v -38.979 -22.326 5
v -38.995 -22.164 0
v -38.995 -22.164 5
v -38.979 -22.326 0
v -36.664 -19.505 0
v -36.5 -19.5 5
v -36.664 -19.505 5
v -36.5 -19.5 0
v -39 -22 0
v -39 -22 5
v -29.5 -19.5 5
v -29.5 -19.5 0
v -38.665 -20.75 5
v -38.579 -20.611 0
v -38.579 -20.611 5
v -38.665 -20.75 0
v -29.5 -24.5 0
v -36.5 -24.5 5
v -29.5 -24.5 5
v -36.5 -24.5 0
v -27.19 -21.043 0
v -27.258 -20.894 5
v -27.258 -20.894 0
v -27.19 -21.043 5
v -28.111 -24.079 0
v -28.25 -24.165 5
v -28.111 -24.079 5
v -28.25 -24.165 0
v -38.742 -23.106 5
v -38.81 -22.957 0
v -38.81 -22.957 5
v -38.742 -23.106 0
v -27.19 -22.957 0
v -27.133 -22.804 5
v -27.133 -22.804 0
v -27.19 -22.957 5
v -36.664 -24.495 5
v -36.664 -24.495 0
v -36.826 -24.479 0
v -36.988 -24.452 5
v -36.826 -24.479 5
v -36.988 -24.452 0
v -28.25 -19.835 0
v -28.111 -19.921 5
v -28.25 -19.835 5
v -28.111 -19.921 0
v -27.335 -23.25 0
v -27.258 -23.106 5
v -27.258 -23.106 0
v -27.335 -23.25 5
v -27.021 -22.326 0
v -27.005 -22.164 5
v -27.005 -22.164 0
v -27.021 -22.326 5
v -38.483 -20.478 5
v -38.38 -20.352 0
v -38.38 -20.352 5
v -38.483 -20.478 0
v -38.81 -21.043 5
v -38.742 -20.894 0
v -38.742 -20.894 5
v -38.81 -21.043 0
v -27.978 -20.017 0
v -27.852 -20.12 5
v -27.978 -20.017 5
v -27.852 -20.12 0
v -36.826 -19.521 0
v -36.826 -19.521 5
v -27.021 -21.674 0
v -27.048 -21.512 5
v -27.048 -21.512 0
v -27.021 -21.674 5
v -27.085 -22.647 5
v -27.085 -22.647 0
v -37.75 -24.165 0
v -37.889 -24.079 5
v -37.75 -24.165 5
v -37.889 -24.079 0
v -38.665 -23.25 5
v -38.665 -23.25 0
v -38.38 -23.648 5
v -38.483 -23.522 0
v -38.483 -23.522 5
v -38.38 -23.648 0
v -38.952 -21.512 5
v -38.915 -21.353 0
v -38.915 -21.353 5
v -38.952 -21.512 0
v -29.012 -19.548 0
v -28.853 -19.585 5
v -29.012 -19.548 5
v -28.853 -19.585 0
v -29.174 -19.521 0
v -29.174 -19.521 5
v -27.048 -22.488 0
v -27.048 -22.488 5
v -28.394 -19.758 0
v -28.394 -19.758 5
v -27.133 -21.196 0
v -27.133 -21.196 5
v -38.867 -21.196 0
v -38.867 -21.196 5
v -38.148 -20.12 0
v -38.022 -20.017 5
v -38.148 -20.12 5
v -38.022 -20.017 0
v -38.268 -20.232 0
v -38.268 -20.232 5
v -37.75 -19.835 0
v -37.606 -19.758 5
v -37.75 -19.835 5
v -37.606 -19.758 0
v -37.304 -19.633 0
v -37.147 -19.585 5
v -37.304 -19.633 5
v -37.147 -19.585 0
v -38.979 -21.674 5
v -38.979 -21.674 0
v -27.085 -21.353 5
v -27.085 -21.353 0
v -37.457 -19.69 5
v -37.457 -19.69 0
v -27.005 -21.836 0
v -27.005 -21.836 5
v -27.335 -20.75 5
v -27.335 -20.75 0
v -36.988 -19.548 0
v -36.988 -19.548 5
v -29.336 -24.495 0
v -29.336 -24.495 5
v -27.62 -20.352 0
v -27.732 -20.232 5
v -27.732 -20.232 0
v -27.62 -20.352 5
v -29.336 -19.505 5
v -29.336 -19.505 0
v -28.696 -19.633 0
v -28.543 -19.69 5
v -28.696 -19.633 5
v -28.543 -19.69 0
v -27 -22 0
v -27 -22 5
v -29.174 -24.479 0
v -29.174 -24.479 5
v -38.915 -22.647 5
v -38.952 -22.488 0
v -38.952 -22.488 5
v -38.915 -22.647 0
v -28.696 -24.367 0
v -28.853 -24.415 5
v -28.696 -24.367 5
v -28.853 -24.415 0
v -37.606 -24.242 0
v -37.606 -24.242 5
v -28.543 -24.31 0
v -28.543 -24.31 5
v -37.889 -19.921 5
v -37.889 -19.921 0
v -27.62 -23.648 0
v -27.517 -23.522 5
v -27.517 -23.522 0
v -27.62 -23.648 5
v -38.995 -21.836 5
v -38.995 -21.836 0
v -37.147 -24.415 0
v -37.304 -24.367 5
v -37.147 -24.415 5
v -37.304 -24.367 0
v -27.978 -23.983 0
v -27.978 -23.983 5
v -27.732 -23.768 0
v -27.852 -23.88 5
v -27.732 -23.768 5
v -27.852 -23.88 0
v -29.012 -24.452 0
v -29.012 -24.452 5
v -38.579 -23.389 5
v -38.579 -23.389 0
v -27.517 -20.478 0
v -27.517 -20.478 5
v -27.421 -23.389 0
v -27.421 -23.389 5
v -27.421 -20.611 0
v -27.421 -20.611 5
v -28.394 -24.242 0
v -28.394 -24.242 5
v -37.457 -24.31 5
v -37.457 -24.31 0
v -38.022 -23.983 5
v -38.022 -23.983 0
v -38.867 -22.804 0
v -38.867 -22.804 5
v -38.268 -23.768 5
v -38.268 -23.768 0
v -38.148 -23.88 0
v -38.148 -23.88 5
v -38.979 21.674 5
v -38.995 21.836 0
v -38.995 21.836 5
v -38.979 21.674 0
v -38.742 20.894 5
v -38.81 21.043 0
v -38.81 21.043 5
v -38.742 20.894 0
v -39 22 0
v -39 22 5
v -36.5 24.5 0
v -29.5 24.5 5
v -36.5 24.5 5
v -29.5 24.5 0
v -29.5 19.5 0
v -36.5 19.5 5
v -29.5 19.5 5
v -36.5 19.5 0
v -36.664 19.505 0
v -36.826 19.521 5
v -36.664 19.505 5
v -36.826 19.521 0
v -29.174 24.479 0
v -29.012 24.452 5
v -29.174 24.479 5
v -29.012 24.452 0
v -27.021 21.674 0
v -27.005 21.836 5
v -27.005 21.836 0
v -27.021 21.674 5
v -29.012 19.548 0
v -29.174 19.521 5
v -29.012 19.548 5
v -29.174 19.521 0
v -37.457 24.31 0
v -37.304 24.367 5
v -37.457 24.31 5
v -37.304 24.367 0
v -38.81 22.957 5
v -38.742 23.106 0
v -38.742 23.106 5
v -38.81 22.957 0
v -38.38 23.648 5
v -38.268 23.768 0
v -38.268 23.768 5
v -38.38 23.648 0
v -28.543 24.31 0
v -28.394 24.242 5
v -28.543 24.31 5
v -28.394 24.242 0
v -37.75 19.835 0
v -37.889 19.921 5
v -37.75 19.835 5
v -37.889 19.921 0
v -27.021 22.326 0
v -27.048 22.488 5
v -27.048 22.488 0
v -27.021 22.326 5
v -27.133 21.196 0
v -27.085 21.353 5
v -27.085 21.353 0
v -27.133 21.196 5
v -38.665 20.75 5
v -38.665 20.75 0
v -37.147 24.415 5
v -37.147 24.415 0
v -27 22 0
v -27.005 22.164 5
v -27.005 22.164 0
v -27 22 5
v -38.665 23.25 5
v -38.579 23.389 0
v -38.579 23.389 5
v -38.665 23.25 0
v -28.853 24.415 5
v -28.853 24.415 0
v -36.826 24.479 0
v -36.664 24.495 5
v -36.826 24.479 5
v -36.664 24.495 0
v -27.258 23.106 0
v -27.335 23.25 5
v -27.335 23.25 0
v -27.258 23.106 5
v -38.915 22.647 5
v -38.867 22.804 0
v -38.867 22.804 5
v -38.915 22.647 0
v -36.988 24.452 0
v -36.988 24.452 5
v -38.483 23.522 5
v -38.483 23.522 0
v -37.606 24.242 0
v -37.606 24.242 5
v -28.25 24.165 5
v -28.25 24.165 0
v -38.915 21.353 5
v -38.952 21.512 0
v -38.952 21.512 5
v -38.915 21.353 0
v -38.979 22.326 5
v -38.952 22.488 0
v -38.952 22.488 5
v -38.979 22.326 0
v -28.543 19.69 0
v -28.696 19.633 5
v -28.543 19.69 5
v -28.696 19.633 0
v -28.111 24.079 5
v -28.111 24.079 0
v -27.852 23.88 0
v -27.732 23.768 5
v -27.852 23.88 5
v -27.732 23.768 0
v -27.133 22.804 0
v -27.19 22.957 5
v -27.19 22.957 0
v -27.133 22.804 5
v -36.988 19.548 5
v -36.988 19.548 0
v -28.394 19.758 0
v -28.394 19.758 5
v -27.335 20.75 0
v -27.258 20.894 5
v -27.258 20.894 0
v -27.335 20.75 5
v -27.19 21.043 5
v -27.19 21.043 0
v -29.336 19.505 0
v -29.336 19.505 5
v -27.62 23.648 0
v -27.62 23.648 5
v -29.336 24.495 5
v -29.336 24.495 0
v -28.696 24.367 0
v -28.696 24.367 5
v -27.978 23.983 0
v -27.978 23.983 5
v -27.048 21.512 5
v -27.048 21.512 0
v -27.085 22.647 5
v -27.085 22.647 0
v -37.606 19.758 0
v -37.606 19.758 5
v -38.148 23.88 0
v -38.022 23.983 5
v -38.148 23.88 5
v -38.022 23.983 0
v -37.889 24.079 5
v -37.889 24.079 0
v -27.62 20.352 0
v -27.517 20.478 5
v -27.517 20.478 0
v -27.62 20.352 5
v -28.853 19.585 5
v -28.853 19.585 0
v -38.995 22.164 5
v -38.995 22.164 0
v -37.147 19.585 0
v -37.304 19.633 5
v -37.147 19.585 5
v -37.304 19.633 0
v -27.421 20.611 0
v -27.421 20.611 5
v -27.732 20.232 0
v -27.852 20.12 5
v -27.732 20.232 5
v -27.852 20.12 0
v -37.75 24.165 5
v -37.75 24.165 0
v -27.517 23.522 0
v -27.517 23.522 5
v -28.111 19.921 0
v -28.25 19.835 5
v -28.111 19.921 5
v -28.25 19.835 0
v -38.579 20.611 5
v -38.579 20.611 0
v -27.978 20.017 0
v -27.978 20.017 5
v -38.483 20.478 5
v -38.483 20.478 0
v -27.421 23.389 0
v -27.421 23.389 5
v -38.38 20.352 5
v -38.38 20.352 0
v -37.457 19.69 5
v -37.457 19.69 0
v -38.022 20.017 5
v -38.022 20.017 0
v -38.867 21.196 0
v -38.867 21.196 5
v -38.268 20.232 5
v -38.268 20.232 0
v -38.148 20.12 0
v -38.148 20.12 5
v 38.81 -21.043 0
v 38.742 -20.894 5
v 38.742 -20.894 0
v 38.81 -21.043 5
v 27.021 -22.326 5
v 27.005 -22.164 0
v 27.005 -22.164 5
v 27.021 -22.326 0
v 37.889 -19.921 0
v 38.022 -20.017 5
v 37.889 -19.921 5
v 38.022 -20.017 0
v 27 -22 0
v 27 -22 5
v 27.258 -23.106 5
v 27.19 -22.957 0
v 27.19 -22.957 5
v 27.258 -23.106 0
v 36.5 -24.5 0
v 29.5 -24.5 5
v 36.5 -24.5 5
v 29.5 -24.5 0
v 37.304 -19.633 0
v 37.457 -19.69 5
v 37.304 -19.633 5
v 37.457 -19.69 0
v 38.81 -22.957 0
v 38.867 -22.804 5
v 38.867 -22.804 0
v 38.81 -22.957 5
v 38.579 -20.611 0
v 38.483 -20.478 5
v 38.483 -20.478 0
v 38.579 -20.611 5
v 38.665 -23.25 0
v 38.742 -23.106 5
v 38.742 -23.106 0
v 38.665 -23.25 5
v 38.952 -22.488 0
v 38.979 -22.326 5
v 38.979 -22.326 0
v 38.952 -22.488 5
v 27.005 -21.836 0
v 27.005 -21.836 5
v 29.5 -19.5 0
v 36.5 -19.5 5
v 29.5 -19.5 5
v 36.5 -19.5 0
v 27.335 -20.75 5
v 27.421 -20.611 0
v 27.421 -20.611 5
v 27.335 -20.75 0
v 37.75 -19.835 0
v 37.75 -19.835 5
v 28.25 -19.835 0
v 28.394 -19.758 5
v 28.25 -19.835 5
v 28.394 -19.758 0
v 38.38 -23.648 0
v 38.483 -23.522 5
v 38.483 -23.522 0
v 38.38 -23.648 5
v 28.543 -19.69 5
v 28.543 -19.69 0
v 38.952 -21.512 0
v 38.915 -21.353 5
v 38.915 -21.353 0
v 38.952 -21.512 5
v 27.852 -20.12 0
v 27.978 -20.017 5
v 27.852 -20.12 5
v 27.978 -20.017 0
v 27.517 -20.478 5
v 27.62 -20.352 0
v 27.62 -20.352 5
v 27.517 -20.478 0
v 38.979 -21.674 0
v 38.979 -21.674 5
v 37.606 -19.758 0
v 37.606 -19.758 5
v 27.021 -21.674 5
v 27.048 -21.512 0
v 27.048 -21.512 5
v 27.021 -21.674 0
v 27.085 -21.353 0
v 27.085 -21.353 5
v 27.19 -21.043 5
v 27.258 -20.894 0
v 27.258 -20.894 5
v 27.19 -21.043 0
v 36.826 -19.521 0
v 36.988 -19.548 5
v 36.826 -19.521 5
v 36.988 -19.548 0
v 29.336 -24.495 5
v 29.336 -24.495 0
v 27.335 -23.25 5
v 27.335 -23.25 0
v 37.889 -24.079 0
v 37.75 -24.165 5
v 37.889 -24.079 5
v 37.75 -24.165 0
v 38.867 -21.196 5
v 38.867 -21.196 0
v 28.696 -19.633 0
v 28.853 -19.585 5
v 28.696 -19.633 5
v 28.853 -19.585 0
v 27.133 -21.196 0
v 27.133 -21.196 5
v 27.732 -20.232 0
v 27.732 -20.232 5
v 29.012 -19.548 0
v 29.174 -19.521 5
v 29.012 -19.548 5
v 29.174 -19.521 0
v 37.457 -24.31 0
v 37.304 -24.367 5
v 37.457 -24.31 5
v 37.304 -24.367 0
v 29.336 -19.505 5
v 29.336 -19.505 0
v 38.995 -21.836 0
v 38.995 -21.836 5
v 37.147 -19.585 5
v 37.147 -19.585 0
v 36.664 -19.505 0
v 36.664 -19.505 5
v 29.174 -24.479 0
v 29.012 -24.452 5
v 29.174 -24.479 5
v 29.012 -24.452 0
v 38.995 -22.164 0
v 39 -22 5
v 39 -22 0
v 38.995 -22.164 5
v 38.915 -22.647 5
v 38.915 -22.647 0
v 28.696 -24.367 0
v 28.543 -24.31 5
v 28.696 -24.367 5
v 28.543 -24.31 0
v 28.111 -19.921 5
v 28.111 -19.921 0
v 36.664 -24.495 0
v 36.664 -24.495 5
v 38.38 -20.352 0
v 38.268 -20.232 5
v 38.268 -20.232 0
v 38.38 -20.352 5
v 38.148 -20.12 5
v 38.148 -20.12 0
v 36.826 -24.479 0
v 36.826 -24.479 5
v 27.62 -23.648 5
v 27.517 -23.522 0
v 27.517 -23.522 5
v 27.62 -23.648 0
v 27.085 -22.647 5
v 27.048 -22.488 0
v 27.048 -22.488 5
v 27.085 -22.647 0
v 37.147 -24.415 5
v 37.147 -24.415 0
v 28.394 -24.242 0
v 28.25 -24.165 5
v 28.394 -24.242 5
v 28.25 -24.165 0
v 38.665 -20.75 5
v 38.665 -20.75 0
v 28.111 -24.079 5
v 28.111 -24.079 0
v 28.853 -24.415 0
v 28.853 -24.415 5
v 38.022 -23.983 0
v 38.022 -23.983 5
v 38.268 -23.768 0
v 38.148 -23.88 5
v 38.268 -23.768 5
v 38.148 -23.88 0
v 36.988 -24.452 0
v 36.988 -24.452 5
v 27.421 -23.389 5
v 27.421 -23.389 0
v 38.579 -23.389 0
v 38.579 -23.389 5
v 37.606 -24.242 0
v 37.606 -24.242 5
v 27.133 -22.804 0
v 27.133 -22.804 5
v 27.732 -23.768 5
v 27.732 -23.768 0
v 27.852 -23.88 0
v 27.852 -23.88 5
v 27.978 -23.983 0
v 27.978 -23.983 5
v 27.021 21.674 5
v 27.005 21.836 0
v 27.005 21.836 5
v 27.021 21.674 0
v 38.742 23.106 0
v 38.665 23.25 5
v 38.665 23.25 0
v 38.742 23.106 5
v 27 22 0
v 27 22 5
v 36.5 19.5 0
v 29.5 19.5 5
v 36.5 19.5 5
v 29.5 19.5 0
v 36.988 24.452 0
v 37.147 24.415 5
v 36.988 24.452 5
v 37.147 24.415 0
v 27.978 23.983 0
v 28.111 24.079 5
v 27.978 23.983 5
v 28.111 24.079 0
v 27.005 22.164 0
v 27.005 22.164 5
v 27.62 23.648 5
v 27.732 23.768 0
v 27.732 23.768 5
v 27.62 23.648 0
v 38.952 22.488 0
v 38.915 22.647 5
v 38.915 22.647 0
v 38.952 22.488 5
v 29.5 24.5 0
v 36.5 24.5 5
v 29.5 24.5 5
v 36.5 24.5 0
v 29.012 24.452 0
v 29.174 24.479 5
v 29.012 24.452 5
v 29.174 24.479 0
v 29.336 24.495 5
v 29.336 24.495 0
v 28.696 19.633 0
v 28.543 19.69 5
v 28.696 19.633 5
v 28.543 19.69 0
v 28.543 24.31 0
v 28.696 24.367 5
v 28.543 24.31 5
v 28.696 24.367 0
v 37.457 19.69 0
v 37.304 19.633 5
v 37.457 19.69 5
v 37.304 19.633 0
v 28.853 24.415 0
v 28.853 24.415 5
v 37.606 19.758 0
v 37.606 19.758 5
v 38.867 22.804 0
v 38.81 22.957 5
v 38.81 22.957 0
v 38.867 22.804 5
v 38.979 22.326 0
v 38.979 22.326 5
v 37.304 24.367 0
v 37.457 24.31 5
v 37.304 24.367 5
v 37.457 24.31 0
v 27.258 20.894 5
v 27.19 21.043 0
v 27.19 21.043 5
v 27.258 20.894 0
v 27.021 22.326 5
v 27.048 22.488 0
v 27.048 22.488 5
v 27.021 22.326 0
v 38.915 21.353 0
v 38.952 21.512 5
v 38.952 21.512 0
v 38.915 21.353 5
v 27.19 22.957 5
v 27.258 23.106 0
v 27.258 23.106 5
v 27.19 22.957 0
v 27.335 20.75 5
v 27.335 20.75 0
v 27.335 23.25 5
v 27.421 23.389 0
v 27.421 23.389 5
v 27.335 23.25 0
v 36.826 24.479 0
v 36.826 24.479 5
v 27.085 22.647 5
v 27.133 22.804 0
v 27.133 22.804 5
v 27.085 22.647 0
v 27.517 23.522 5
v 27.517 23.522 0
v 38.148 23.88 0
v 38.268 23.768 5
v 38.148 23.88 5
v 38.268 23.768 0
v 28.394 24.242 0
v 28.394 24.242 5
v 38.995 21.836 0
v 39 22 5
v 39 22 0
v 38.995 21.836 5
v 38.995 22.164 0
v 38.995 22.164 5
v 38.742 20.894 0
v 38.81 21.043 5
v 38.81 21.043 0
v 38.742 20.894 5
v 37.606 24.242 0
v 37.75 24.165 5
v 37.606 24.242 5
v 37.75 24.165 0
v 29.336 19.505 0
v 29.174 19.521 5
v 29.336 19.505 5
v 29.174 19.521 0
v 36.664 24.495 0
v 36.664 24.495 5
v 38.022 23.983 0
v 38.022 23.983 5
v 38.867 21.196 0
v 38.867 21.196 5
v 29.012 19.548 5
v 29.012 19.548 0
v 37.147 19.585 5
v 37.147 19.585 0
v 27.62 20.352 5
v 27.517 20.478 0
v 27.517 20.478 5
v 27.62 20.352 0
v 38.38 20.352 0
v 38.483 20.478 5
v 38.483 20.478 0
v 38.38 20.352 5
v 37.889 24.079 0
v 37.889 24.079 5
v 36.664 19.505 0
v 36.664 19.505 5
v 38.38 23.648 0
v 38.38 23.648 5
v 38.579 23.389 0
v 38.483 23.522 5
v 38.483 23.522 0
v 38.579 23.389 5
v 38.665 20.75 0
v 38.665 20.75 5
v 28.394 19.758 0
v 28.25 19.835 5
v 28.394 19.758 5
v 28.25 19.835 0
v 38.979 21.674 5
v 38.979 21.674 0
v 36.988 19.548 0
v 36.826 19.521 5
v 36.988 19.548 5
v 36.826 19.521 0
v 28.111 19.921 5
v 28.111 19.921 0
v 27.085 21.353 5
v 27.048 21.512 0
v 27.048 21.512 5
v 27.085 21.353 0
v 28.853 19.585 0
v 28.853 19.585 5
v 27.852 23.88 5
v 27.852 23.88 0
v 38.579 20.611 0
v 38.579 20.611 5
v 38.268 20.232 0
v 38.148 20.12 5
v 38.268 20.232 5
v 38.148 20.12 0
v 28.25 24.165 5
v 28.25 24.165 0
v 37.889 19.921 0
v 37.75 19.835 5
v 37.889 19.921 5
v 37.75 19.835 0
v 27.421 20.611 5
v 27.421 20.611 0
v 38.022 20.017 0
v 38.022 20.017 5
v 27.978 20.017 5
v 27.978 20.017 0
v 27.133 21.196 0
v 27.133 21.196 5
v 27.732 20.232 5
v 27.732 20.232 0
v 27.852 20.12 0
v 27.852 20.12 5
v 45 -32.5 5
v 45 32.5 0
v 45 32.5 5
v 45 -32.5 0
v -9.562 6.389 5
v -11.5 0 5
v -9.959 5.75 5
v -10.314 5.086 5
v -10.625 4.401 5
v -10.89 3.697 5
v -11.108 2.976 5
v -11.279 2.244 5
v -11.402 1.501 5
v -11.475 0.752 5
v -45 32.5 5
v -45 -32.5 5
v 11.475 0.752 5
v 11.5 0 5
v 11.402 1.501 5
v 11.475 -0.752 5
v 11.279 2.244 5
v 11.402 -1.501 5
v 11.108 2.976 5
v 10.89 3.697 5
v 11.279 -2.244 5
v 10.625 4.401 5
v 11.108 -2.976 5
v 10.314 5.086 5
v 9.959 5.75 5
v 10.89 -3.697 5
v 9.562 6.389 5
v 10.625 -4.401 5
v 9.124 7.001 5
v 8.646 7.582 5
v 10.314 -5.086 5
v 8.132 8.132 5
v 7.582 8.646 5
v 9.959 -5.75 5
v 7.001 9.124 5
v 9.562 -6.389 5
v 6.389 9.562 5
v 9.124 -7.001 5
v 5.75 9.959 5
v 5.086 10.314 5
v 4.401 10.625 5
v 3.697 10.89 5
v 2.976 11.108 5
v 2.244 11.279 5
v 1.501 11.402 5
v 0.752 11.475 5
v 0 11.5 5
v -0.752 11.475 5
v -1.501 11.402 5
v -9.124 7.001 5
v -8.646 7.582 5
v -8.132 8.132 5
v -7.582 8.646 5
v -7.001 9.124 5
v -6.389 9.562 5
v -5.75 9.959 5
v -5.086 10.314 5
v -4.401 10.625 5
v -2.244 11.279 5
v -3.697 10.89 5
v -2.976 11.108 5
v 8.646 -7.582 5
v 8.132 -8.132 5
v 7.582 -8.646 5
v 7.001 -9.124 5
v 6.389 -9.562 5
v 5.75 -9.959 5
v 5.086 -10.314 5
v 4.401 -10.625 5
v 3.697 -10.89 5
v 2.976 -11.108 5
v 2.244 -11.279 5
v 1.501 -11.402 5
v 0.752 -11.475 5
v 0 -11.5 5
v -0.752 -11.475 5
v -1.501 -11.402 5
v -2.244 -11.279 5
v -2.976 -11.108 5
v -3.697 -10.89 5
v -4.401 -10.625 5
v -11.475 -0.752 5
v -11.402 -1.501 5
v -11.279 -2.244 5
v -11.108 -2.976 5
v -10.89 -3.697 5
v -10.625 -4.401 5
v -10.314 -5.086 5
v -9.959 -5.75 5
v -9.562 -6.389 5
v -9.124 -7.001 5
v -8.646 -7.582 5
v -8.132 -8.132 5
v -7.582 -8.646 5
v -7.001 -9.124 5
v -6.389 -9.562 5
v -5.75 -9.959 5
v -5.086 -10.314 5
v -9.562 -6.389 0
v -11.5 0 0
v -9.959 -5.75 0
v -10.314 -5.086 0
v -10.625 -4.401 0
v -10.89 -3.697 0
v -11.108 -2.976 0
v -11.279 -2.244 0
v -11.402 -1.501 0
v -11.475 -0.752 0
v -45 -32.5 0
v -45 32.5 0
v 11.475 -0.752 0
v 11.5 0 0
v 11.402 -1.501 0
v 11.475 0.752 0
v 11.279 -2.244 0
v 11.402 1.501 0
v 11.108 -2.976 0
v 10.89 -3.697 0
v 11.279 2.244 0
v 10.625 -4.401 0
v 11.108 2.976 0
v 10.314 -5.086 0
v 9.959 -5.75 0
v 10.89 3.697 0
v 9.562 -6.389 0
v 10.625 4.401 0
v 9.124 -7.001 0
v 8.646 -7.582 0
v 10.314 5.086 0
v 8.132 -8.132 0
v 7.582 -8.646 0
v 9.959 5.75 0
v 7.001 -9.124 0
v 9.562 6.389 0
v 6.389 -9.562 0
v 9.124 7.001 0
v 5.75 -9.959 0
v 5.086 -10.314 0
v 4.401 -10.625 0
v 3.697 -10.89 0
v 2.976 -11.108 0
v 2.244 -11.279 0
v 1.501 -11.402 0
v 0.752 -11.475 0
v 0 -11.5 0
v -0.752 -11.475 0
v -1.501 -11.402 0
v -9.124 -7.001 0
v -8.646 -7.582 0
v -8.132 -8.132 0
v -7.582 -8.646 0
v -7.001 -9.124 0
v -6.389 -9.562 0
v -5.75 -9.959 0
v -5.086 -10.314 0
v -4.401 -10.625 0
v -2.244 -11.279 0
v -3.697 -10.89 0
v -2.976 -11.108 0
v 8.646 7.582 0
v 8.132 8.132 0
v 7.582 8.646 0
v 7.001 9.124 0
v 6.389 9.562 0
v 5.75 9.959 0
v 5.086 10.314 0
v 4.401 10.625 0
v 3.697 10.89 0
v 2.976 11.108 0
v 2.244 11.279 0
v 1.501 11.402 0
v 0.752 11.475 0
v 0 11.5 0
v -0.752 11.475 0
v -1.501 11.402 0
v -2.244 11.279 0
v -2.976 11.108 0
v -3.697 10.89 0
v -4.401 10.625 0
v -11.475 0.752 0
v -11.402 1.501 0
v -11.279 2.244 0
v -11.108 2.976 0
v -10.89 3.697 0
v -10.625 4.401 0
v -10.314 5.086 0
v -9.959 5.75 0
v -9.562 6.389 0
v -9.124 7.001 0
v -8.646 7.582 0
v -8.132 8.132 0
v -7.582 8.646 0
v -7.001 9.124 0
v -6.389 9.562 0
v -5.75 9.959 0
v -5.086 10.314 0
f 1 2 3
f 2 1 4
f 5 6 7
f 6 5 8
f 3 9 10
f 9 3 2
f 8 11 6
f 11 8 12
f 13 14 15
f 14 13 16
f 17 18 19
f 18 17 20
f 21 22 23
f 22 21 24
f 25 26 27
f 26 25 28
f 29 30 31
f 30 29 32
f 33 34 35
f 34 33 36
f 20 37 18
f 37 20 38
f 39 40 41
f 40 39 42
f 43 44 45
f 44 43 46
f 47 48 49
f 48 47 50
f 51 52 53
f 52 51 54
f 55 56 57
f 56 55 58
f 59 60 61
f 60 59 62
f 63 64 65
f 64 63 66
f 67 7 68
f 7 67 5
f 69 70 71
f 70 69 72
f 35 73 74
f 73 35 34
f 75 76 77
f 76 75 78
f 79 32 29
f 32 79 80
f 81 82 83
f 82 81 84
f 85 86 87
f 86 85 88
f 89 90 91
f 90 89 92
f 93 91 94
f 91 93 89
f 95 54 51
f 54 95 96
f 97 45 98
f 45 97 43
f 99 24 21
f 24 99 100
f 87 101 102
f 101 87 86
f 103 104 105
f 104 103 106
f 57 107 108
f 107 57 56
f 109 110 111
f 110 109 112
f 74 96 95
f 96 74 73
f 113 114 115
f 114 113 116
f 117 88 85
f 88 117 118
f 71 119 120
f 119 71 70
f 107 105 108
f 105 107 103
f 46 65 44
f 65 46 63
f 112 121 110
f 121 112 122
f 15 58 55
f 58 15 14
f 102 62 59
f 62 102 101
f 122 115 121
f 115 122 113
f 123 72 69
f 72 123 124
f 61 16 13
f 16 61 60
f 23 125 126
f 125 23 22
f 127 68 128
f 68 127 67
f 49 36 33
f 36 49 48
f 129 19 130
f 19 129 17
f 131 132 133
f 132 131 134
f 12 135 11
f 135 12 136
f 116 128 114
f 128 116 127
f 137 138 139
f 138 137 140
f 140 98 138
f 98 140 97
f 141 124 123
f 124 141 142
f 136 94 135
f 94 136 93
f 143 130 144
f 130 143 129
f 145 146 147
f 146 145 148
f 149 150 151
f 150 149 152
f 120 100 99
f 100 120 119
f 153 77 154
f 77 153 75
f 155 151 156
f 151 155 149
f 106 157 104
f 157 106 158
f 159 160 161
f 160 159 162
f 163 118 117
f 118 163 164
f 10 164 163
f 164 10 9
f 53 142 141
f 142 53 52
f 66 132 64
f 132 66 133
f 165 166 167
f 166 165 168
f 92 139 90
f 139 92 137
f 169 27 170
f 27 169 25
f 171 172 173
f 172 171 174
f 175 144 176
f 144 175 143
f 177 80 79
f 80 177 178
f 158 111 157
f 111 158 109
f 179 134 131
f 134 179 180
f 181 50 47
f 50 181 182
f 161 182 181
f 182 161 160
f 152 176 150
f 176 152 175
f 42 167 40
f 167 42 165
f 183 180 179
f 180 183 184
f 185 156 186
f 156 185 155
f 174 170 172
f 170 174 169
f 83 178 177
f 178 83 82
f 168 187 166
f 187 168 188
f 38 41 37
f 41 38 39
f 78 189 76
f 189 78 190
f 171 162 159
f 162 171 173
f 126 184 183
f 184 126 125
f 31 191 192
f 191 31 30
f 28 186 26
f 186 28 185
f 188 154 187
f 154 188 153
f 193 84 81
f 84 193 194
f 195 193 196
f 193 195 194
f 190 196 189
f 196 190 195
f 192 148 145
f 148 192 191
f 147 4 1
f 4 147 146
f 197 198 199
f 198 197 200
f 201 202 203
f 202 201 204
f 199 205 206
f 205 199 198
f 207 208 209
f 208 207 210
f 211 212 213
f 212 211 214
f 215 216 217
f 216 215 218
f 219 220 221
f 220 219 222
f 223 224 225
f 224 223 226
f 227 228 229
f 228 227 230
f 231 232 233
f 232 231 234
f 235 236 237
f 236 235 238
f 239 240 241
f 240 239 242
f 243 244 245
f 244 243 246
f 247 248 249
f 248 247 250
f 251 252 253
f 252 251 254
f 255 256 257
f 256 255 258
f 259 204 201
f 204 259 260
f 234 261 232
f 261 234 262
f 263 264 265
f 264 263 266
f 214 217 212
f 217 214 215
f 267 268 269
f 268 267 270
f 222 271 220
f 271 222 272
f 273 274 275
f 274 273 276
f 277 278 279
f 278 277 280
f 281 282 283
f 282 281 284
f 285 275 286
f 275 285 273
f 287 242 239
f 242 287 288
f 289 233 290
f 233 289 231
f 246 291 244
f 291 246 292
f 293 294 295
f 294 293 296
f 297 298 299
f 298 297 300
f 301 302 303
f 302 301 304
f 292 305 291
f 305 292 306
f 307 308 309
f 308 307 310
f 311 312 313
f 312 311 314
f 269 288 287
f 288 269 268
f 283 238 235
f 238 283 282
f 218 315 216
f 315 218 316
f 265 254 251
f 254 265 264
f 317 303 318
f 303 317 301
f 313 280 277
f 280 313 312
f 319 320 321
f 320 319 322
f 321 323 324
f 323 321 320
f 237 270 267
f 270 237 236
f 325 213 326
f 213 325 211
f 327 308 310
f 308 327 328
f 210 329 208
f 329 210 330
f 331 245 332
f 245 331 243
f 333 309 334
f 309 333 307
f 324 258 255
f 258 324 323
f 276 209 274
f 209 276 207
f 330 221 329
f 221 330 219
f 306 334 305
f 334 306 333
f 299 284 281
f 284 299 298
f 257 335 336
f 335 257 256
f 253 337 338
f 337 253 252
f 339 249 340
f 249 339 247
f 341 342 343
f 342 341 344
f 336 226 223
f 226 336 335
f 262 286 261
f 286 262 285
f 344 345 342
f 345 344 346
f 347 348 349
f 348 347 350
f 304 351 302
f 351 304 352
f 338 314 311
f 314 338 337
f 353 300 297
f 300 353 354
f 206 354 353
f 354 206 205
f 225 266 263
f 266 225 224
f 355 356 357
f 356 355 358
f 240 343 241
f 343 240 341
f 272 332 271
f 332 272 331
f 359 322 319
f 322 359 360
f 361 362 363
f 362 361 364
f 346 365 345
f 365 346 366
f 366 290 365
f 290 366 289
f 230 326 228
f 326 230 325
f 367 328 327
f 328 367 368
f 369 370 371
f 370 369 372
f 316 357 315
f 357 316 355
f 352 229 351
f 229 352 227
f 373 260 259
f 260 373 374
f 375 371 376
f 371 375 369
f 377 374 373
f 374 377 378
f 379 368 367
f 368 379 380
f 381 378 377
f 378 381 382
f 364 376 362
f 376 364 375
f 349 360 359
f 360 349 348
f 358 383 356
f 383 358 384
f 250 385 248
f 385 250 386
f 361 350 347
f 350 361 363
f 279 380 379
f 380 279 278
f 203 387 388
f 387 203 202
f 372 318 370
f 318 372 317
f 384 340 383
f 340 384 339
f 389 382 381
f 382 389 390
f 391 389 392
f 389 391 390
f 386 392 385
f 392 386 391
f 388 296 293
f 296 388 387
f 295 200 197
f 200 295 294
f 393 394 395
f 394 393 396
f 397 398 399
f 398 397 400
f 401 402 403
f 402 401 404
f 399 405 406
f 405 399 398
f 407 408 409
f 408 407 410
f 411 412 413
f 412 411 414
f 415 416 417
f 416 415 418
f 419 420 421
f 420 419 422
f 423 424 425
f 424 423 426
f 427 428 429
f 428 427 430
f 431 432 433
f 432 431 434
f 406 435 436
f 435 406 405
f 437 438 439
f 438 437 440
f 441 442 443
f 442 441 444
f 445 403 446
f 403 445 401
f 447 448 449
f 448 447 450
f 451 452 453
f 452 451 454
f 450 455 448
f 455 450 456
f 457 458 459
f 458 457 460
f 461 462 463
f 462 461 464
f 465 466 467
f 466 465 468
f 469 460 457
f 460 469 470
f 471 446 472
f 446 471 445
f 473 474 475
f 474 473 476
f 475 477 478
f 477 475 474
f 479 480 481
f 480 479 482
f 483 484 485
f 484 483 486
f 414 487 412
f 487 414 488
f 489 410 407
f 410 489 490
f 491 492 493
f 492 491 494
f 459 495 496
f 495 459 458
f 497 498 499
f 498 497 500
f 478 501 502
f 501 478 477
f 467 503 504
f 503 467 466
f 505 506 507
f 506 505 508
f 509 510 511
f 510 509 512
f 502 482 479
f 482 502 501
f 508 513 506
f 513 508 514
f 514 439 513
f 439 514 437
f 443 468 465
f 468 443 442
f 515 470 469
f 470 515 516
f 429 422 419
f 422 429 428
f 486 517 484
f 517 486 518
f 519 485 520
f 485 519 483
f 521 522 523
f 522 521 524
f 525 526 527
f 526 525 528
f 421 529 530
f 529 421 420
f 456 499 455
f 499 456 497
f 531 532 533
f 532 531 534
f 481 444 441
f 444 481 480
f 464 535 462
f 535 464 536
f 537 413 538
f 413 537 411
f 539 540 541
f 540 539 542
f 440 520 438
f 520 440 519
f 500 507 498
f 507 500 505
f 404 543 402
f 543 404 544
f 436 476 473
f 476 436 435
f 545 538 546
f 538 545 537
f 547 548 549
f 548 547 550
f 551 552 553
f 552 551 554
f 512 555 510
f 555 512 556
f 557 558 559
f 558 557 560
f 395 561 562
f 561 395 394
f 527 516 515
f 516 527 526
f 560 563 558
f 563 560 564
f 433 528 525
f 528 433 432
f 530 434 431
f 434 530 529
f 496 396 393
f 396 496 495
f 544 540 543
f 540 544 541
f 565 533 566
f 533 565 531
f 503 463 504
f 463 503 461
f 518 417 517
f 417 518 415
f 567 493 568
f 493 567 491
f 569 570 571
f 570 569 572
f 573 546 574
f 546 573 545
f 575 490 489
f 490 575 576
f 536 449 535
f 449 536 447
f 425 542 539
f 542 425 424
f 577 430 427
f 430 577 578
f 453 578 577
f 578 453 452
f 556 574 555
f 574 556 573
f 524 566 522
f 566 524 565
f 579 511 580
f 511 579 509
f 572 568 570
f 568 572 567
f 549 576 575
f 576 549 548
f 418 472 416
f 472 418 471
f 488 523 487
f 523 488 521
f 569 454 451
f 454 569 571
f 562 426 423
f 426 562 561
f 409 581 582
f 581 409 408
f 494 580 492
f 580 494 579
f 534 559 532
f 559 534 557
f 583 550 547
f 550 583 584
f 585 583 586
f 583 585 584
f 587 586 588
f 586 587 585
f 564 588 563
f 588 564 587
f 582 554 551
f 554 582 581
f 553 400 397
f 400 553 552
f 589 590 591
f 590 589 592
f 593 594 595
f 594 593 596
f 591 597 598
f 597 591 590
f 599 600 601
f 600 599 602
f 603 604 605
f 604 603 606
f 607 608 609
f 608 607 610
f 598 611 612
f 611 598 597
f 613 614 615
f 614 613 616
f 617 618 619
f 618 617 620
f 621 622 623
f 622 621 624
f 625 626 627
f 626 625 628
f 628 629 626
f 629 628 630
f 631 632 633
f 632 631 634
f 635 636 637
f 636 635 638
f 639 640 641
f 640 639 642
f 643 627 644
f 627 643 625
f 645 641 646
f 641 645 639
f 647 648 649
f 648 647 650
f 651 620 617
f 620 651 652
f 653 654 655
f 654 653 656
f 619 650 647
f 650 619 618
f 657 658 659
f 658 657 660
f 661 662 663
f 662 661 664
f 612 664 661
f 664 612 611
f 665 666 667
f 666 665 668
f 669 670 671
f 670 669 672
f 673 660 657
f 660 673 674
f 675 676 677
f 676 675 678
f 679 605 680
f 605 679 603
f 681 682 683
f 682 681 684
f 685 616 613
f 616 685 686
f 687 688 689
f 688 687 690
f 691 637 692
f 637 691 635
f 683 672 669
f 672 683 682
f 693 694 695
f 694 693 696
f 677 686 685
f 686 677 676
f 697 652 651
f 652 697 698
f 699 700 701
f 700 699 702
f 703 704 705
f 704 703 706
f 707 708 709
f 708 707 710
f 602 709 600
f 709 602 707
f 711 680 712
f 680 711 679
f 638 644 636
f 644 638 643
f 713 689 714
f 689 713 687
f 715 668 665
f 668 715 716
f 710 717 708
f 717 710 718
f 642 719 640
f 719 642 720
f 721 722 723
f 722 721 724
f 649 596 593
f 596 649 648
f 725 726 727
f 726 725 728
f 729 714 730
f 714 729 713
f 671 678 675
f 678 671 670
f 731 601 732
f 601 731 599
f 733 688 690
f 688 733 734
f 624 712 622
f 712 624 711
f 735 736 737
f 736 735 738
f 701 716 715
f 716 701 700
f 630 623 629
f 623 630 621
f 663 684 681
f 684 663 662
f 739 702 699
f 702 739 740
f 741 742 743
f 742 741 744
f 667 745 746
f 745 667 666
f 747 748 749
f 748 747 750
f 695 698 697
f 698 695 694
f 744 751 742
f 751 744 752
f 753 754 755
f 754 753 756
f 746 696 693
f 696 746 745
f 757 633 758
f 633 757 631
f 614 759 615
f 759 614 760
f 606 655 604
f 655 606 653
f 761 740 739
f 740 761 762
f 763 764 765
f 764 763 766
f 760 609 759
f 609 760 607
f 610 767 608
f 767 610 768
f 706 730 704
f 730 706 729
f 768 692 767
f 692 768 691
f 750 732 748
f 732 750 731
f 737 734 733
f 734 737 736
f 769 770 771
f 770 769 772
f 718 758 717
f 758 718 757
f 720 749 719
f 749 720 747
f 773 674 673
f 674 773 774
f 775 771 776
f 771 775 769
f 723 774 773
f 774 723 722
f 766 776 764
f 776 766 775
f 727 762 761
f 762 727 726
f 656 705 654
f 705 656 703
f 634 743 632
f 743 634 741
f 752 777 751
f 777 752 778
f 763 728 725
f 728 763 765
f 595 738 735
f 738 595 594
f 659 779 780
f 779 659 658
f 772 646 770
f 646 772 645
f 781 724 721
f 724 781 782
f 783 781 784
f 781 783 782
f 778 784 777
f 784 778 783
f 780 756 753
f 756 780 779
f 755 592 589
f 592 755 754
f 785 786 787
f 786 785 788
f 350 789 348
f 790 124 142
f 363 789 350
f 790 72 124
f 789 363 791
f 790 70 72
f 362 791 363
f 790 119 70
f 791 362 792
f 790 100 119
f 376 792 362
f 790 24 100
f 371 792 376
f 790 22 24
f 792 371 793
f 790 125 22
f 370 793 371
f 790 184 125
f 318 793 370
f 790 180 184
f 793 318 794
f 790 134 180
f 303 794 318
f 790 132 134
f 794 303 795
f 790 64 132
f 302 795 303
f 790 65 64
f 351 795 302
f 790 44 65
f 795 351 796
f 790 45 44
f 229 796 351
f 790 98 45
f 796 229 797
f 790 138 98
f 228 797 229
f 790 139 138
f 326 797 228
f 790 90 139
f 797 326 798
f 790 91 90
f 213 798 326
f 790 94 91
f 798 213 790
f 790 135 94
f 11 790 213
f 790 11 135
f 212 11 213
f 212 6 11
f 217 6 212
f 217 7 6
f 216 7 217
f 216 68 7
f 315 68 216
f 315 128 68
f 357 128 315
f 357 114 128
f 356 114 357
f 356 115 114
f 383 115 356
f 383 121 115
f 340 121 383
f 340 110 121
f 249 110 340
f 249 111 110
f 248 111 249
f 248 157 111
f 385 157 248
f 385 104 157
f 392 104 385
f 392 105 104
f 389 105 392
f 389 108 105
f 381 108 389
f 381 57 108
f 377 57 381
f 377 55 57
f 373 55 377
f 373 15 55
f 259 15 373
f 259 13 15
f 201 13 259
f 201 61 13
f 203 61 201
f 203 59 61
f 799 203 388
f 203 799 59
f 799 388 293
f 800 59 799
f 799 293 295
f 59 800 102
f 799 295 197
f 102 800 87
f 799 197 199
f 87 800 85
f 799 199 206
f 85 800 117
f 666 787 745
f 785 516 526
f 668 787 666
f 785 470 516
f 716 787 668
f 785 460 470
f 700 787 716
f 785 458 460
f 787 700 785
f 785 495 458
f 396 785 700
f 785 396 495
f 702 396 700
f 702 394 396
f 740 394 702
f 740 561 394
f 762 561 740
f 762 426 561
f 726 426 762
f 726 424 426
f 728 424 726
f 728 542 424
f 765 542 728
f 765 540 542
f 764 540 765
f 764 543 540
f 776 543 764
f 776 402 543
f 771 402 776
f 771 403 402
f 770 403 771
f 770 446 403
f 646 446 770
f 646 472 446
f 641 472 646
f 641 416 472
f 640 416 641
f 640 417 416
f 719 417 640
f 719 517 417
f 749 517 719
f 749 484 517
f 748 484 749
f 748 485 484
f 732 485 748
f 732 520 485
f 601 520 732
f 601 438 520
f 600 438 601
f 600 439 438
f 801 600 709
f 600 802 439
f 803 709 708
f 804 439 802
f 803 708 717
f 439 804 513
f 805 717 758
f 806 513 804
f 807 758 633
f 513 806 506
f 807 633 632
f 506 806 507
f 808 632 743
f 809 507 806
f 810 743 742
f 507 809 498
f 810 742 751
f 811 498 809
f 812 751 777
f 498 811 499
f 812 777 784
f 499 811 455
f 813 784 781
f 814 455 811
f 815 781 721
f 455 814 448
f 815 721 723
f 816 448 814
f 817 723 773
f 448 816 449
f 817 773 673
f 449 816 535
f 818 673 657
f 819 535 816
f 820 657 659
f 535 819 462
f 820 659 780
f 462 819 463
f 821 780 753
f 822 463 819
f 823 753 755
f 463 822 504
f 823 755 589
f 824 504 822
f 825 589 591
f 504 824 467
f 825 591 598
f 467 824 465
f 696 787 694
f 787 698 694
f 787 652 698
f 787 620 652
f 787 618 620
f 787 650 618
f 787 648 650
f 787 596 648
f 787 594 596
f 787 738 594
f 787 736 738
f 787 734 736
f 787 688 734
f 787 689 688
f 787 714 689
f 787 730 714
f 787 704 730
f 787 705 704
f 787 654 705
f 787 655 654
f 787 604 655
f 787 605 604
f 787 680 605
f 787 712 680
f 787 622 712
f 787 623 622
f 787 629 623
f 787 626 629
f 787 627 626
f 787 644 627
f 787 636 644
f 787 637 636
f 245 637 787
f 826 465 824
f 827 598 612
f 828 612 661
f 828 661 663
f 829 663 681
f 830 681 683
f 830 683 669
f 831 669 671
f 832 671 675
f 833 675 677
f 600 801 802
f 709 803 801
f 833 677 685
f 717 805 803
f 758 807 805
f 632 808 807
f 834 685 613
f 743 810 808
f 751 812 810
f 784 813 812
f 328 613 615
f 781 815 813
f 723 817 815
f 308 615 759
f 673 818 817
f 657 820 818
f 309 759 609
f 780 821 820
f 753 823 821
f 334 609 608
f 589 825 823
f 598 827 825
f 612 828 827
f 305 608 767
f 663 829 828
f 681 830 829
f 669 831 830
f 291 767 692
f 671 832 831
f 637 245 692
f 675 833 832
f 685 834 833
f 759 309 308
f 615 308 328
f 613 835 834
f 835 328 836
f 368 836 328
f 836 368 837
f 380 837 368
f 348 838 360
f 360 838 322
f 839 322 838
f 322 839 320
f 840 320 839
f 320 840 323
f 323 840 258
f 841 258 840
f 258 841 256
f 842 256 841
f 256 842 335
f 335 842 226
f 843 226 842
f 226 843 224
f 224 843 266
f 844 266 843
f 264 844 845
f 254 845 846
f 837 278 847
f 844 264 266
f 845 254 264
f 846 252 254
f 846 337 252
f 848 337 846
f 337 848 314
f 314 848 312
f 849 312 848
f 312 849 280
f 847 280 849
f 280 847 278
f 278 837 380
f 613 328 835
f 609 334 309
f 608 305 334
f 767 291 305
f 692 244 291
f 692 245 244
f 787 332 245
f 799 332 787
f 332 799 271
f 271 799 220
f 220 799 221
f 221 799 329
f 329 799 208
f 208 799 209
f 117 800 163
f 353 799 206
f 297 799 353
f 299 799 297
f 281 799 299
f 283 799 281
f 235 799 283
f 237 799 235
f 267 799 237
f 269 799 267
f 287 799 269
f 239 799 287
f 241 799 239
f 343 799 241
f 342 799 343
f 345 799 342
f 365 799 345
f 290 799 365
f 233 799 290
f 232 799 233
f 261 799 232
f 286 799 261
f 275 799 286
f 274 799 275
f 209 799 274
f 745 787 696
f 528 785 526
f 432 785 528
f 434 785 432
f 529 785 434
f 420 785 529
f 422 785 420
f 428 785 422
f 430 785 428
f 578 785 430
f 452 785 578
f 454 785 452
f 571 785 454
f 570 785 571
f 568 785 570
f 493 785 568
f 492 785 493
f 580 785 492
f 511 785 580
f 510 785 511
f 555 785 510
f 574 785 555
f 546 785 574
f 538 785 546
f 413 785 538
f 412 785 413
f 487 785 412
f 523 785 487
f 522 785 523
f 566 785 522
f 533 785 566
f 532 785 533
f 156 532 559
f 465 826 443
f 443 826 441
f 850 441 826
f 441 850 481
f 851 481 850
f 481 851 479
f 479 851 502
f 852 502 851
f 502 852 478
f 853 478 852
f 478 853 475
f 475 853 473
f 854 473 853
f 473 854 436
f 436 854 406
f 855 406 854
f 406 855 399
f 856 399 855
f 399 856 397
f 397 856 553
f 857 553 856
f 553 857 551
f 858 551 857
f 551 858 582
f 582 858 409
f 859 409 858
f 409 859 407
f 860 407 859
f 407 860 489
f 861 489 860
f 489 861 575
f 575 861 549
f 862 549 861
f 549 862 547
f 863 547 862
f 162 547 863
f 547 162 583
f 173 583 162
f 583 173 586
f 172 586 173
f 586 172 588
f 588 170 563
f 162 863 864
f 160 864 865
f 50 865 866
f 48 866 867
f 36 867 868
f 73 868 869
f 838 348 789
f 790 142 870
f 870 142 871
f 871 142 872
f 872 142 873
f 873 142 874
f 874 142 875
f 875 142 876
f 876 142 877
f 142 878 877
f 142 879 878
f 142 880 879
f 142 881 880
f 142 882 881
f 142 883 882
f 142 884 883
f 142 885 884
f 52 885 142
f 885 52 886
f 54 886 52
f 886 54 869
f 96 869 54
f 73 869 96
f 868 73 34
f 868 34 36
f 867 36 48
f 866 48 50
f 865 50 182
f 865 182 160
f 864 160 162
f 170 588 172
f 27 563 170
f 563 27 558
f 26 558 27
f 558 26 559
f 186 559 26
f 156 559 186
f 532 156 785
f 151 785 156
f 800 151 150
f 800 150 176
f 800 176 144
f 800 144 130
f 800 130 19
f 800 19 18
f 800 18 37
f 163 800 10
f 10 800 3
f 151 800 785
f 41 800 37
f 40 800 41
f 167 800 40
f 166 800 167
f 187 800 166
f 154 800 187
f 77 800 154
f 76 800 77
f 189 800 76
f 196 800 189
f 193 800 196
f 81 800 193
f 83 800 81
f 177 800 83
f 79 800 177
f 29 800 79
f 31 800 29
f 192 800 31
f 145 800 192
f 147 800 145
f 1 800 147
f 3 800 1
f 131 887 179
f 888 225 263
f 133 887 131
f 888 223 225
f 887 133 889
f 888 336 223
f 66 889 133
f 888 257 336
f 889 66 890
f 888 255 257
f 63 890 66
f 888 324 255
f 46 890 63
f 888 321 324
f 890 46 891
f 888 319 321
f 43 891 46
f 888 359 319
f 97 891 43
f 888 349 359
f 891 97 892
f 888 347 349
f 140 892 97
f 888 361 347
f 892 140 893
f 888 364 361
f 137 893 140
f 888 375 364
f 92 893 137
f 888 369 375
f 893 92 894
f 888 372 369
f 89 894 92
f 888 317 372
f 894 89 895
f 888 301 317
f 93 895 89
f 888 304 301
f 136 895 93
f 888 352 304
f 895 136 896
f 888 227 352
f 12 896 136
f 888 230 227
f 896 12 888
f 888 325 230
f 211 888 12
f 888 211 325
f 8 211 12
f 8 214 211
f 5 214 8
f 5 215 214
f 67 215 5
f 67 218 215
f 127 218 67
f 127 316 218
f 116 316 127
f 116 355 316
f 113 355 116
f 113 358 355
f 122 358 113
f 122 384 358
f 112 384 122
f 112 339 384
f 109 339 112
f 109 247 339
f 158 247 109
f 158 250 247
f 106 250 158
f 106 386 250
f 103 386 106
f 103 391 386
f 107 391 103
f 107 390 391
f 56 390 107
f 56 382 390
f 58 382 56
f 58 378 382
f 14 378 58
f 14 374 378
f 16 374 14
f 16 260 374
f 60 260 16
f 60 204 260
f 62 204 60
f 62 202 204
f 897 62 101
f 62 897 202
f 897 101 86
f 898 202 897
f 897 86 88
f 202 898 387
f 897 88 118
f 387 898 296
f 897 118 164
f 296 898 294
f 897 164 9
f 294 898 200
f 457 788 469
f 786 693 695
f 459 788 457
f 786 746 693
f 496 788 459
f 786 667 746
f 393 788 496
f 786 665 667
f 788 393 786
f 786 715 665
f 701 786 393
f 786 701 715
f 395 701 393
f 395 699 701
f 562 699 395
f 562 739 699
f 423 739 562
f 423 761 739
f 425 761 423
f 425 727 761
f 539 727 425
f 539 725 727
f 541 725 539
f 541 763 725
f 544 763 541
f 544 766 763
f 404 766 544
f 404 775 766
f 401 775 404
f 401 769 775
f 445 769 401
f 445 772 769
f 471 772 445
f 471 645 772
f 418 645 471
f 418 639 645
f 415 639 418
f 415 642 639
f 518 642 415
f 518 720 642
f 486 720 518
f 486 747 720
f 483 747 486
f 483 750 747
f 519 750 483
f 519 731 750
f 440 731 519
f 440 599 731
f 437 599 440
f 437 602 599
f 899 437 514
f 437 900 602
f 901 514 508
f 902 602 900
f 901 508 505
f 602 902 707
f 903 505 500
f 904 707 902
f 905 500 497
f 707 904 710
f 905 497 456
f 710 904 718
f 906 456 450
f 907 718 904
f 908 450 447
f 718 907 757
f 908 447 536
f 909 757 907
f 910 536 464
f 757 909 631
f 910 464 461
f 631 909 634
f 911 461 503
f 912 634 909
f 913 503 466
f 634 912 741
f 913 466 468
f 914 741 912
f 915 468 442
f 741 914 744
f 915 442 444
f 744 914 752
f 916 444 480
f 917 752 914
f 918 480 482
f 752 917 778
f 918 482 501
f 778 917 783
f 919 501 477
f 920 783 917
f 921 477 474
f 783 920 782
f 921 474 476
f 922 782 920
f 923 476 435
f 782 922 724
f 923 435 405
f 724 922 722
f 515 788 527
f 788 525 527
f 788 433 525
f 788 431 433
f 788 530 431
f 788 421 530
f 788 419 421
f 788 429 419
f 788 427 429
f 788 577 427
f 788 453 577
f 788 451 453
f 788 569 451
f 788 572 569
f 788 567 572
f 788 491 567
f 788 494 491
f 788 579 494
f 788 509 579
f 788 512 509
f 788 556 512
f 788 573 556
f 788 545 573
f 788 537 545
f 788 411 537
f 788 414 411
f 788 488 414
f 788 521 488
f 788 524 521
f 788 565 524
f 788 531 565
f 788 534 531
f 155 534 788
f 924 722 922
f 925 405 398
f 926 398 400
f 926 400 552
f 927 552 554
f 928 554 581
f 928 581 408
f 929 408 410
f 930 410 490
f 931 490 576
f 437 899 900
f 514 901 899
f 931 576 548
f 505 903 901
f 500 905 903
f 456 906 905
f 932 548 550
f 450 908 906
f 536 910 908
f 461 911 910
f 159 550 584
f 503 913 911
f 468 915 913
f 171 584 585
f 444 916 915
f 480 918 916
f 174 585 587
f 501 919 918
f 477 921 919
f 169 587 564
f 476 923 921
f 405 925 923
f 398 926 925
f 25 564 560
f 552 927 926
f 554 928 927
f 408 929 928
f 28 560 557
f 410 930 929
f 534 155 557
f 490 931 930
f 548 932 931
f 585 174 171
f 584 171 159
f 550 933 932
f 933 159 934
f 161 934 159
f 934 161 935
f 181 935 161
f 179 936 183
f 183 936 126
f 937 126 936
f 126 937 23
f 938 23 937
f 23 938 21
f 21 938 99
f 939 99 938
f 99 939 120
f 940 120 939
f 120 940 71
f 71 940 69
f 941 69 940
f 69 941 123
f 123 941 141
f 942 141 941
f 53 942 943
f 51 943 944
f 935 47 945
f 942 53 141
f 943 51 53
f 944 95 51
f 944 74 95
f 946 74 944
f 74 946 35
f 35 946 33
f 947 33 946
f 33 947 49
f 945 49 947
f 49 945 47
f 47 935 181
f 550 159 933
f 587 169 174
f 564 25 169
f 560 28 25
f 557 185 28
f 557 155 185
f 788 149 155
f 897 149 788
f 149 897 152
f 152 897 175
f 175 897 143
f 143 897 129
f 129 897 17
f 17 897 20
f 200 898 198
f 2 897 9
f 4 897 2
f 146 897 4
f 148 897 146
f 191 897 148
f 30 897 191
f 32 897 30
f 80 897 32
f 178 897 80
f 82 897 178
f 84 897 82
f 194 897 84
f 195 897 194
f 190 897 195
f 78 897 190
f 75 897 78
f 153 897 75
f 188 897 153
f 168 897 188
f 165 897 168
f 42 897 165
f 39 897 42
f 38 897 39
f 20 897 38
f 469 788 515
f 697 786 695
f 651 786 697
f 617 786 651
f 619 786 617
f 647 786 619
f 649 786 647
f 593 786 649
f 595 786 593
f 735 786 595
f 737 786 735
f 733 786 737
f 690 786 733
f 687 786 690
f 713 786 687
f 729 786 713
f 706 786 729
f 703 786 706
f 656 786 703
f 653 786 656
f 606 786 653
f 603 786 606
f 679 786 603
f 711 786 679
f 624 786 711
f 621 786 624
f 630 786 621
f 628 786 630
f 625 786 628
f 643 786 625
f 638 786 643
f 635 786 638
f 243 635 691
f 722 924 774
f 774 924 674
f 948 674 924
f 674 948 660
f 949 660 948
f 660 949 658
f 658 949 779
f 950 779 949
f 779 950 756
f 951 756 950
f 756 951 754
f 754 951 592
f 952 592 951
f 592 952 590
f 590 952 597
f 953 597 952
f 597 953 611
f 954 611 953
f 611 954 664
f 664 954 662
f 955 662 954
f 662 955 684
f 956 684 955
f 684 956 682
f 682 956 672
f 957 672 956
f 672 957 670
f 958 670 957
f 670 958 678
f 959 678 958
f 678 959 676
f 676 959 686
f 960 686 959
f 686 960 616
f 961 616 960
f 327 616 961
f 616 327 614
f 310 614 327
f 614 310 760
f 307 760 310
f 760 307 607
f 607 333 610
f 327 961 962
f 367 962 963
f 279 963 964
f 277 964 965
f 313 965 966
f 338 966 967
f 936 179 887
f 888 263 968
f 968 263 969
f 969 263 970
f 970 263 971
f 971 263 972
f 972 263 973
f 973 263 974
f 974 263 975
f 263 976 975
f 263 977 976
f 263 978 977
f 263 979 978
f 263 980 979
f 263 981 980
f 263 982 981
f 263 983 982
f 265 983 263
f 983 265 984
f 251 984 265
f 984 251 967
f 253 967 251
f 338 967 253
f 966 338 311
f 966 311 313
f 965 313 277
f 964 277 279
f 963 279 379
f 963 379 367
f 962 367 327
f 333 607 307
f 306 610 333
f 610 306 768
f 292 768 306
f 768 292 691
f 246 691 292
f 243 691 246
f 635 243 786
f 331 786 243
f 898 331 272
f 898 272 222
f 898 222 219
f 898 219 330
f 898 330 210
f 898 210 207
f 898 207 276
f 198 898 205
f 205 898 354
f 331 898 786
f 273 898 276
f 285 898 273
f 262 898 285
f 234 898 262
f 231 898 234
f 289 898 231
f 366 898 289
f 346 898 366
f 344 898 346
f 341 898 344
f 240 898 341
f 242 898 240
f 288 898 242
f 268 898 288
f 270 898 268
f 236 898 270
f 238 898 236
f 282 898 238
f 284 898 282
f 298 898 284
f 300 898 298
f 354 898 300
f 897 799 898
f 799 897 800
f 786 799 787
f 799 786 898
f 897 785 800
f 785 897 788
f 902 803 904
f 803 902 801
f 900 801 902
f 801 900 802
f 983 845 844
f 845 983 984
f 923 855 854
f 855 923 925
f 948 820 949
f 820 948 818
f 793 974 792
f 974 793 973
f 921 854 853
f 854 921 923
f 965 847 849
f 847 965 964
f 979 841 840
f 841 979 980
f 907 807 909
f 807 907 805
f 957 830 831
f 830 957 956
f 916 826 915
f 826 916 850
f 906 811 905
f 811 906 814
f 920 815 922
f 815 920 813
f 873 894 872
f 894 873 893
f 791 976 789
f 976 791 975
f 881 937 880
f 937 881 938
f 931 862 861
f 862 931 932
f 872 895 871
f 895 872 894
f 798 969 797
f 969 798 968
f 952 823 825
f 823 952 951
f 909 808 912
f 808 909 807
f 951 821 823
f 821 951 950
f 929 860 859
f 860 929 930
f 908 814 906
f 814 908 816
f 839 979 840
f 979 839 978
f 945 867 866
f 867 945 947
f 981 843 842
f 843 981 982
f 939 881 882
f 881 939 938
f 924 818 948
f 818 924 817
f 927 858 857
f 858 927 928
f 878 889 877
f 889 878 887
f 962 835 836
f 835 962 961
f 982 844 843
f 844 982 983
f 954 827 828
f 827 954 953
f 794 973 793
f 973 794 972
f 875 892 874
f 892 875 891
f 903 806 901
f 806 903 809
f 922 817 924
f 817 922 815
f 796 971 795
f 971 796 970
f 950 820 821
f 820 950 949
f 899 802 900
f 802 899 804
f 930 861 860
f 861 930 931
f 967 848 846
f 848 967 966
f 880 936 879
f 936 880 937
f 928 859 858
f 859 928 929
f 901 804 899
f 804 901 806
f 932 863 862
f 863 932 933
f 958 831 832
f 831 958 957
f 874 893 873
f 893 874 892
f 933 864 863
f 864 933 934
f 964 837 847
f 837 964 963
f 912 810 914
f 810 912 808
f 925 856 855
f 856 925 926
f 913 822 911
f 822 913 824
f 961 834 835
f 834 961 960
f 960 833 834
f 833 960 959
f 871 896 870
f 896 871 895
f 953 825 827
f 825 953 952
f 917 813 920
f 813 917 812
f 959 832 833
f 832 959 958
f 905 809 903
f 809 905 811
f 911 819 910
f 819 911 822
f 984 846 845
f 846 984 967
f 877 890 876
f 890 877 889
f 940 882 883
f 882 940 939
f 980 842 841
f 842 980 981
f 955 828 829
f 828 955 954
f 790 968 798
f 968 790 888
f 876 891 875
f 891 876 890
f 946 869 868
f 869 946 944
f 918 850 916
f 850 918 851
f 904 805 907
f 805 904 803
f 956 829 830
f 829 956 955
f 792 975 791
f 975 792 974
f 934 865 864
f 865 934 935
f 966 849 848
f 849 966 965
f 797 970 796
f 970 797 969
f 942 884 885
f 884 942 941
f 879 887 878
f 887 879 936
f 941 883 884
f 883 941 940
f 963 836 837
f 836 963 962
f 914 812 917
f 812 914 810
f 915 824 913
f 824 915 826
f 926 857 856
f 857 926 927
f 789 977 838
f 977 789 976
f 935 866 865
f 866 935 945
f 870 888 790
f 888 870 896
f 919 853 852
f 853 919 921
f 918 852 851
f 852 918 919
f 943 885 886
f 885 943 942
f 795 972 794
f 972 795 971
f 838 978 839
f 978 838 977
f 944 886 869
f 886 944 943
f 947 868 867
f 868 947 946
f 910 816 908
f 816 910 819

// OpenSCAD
// M-02 Placa soporte paramétrica para sonda JSN-SR04T (PRELIMINAR)
// Objeto: adaptador genérico para soporte externo del laboratorio, no fijación al tanque.
// Las dimensiones siguientes SON PROVISIONALES. Medir diámetro real del transductor,
// su sistema de retención, la separación del soporte y disponibilidad de tornillos.
// NO FABRICAR sin revisar las medidas y la holgura por zona ciega del sensor.
// Unidades: mm
plate_x = 90.0;
plate_y = 65.0;
plate_thickness = 5.0;
probe_hole_d = 23.0; // VERIFICAR: versiones comerciales pueden diferir.
mount_slot_length = 12.0; // Longitud total, incluidos extremos redondeados.
mount_slot_width = 5.0;
mount_x = 33.0;
mount_y = 22.0;
$fn = 96;
module slot_2d(L, W) {
    hull() {
        translate([-(L-W)/2, 0]) circle(d=W);
        translate([+(L-W)/2, 0]) circle(d=W);
    }
}
module support_plate() {
    difference() {
        translate([-plate_x/2,-plate_y/2,0]) cube([plate_x,plate_y,plate_thickness]);
        translate([0,0,-1]) cylinder(d=probe_hole_d,h=plate_thickness+2);
        for(x=[-mount_x,mount_x],y=[-mount_y,mount_y])
            translate([x,y,-1]) linear_extrude(height=plate_thickness+2)
                slot_2d(mount_slot_length,mount_slot_width);
    }
}
support_plate();
